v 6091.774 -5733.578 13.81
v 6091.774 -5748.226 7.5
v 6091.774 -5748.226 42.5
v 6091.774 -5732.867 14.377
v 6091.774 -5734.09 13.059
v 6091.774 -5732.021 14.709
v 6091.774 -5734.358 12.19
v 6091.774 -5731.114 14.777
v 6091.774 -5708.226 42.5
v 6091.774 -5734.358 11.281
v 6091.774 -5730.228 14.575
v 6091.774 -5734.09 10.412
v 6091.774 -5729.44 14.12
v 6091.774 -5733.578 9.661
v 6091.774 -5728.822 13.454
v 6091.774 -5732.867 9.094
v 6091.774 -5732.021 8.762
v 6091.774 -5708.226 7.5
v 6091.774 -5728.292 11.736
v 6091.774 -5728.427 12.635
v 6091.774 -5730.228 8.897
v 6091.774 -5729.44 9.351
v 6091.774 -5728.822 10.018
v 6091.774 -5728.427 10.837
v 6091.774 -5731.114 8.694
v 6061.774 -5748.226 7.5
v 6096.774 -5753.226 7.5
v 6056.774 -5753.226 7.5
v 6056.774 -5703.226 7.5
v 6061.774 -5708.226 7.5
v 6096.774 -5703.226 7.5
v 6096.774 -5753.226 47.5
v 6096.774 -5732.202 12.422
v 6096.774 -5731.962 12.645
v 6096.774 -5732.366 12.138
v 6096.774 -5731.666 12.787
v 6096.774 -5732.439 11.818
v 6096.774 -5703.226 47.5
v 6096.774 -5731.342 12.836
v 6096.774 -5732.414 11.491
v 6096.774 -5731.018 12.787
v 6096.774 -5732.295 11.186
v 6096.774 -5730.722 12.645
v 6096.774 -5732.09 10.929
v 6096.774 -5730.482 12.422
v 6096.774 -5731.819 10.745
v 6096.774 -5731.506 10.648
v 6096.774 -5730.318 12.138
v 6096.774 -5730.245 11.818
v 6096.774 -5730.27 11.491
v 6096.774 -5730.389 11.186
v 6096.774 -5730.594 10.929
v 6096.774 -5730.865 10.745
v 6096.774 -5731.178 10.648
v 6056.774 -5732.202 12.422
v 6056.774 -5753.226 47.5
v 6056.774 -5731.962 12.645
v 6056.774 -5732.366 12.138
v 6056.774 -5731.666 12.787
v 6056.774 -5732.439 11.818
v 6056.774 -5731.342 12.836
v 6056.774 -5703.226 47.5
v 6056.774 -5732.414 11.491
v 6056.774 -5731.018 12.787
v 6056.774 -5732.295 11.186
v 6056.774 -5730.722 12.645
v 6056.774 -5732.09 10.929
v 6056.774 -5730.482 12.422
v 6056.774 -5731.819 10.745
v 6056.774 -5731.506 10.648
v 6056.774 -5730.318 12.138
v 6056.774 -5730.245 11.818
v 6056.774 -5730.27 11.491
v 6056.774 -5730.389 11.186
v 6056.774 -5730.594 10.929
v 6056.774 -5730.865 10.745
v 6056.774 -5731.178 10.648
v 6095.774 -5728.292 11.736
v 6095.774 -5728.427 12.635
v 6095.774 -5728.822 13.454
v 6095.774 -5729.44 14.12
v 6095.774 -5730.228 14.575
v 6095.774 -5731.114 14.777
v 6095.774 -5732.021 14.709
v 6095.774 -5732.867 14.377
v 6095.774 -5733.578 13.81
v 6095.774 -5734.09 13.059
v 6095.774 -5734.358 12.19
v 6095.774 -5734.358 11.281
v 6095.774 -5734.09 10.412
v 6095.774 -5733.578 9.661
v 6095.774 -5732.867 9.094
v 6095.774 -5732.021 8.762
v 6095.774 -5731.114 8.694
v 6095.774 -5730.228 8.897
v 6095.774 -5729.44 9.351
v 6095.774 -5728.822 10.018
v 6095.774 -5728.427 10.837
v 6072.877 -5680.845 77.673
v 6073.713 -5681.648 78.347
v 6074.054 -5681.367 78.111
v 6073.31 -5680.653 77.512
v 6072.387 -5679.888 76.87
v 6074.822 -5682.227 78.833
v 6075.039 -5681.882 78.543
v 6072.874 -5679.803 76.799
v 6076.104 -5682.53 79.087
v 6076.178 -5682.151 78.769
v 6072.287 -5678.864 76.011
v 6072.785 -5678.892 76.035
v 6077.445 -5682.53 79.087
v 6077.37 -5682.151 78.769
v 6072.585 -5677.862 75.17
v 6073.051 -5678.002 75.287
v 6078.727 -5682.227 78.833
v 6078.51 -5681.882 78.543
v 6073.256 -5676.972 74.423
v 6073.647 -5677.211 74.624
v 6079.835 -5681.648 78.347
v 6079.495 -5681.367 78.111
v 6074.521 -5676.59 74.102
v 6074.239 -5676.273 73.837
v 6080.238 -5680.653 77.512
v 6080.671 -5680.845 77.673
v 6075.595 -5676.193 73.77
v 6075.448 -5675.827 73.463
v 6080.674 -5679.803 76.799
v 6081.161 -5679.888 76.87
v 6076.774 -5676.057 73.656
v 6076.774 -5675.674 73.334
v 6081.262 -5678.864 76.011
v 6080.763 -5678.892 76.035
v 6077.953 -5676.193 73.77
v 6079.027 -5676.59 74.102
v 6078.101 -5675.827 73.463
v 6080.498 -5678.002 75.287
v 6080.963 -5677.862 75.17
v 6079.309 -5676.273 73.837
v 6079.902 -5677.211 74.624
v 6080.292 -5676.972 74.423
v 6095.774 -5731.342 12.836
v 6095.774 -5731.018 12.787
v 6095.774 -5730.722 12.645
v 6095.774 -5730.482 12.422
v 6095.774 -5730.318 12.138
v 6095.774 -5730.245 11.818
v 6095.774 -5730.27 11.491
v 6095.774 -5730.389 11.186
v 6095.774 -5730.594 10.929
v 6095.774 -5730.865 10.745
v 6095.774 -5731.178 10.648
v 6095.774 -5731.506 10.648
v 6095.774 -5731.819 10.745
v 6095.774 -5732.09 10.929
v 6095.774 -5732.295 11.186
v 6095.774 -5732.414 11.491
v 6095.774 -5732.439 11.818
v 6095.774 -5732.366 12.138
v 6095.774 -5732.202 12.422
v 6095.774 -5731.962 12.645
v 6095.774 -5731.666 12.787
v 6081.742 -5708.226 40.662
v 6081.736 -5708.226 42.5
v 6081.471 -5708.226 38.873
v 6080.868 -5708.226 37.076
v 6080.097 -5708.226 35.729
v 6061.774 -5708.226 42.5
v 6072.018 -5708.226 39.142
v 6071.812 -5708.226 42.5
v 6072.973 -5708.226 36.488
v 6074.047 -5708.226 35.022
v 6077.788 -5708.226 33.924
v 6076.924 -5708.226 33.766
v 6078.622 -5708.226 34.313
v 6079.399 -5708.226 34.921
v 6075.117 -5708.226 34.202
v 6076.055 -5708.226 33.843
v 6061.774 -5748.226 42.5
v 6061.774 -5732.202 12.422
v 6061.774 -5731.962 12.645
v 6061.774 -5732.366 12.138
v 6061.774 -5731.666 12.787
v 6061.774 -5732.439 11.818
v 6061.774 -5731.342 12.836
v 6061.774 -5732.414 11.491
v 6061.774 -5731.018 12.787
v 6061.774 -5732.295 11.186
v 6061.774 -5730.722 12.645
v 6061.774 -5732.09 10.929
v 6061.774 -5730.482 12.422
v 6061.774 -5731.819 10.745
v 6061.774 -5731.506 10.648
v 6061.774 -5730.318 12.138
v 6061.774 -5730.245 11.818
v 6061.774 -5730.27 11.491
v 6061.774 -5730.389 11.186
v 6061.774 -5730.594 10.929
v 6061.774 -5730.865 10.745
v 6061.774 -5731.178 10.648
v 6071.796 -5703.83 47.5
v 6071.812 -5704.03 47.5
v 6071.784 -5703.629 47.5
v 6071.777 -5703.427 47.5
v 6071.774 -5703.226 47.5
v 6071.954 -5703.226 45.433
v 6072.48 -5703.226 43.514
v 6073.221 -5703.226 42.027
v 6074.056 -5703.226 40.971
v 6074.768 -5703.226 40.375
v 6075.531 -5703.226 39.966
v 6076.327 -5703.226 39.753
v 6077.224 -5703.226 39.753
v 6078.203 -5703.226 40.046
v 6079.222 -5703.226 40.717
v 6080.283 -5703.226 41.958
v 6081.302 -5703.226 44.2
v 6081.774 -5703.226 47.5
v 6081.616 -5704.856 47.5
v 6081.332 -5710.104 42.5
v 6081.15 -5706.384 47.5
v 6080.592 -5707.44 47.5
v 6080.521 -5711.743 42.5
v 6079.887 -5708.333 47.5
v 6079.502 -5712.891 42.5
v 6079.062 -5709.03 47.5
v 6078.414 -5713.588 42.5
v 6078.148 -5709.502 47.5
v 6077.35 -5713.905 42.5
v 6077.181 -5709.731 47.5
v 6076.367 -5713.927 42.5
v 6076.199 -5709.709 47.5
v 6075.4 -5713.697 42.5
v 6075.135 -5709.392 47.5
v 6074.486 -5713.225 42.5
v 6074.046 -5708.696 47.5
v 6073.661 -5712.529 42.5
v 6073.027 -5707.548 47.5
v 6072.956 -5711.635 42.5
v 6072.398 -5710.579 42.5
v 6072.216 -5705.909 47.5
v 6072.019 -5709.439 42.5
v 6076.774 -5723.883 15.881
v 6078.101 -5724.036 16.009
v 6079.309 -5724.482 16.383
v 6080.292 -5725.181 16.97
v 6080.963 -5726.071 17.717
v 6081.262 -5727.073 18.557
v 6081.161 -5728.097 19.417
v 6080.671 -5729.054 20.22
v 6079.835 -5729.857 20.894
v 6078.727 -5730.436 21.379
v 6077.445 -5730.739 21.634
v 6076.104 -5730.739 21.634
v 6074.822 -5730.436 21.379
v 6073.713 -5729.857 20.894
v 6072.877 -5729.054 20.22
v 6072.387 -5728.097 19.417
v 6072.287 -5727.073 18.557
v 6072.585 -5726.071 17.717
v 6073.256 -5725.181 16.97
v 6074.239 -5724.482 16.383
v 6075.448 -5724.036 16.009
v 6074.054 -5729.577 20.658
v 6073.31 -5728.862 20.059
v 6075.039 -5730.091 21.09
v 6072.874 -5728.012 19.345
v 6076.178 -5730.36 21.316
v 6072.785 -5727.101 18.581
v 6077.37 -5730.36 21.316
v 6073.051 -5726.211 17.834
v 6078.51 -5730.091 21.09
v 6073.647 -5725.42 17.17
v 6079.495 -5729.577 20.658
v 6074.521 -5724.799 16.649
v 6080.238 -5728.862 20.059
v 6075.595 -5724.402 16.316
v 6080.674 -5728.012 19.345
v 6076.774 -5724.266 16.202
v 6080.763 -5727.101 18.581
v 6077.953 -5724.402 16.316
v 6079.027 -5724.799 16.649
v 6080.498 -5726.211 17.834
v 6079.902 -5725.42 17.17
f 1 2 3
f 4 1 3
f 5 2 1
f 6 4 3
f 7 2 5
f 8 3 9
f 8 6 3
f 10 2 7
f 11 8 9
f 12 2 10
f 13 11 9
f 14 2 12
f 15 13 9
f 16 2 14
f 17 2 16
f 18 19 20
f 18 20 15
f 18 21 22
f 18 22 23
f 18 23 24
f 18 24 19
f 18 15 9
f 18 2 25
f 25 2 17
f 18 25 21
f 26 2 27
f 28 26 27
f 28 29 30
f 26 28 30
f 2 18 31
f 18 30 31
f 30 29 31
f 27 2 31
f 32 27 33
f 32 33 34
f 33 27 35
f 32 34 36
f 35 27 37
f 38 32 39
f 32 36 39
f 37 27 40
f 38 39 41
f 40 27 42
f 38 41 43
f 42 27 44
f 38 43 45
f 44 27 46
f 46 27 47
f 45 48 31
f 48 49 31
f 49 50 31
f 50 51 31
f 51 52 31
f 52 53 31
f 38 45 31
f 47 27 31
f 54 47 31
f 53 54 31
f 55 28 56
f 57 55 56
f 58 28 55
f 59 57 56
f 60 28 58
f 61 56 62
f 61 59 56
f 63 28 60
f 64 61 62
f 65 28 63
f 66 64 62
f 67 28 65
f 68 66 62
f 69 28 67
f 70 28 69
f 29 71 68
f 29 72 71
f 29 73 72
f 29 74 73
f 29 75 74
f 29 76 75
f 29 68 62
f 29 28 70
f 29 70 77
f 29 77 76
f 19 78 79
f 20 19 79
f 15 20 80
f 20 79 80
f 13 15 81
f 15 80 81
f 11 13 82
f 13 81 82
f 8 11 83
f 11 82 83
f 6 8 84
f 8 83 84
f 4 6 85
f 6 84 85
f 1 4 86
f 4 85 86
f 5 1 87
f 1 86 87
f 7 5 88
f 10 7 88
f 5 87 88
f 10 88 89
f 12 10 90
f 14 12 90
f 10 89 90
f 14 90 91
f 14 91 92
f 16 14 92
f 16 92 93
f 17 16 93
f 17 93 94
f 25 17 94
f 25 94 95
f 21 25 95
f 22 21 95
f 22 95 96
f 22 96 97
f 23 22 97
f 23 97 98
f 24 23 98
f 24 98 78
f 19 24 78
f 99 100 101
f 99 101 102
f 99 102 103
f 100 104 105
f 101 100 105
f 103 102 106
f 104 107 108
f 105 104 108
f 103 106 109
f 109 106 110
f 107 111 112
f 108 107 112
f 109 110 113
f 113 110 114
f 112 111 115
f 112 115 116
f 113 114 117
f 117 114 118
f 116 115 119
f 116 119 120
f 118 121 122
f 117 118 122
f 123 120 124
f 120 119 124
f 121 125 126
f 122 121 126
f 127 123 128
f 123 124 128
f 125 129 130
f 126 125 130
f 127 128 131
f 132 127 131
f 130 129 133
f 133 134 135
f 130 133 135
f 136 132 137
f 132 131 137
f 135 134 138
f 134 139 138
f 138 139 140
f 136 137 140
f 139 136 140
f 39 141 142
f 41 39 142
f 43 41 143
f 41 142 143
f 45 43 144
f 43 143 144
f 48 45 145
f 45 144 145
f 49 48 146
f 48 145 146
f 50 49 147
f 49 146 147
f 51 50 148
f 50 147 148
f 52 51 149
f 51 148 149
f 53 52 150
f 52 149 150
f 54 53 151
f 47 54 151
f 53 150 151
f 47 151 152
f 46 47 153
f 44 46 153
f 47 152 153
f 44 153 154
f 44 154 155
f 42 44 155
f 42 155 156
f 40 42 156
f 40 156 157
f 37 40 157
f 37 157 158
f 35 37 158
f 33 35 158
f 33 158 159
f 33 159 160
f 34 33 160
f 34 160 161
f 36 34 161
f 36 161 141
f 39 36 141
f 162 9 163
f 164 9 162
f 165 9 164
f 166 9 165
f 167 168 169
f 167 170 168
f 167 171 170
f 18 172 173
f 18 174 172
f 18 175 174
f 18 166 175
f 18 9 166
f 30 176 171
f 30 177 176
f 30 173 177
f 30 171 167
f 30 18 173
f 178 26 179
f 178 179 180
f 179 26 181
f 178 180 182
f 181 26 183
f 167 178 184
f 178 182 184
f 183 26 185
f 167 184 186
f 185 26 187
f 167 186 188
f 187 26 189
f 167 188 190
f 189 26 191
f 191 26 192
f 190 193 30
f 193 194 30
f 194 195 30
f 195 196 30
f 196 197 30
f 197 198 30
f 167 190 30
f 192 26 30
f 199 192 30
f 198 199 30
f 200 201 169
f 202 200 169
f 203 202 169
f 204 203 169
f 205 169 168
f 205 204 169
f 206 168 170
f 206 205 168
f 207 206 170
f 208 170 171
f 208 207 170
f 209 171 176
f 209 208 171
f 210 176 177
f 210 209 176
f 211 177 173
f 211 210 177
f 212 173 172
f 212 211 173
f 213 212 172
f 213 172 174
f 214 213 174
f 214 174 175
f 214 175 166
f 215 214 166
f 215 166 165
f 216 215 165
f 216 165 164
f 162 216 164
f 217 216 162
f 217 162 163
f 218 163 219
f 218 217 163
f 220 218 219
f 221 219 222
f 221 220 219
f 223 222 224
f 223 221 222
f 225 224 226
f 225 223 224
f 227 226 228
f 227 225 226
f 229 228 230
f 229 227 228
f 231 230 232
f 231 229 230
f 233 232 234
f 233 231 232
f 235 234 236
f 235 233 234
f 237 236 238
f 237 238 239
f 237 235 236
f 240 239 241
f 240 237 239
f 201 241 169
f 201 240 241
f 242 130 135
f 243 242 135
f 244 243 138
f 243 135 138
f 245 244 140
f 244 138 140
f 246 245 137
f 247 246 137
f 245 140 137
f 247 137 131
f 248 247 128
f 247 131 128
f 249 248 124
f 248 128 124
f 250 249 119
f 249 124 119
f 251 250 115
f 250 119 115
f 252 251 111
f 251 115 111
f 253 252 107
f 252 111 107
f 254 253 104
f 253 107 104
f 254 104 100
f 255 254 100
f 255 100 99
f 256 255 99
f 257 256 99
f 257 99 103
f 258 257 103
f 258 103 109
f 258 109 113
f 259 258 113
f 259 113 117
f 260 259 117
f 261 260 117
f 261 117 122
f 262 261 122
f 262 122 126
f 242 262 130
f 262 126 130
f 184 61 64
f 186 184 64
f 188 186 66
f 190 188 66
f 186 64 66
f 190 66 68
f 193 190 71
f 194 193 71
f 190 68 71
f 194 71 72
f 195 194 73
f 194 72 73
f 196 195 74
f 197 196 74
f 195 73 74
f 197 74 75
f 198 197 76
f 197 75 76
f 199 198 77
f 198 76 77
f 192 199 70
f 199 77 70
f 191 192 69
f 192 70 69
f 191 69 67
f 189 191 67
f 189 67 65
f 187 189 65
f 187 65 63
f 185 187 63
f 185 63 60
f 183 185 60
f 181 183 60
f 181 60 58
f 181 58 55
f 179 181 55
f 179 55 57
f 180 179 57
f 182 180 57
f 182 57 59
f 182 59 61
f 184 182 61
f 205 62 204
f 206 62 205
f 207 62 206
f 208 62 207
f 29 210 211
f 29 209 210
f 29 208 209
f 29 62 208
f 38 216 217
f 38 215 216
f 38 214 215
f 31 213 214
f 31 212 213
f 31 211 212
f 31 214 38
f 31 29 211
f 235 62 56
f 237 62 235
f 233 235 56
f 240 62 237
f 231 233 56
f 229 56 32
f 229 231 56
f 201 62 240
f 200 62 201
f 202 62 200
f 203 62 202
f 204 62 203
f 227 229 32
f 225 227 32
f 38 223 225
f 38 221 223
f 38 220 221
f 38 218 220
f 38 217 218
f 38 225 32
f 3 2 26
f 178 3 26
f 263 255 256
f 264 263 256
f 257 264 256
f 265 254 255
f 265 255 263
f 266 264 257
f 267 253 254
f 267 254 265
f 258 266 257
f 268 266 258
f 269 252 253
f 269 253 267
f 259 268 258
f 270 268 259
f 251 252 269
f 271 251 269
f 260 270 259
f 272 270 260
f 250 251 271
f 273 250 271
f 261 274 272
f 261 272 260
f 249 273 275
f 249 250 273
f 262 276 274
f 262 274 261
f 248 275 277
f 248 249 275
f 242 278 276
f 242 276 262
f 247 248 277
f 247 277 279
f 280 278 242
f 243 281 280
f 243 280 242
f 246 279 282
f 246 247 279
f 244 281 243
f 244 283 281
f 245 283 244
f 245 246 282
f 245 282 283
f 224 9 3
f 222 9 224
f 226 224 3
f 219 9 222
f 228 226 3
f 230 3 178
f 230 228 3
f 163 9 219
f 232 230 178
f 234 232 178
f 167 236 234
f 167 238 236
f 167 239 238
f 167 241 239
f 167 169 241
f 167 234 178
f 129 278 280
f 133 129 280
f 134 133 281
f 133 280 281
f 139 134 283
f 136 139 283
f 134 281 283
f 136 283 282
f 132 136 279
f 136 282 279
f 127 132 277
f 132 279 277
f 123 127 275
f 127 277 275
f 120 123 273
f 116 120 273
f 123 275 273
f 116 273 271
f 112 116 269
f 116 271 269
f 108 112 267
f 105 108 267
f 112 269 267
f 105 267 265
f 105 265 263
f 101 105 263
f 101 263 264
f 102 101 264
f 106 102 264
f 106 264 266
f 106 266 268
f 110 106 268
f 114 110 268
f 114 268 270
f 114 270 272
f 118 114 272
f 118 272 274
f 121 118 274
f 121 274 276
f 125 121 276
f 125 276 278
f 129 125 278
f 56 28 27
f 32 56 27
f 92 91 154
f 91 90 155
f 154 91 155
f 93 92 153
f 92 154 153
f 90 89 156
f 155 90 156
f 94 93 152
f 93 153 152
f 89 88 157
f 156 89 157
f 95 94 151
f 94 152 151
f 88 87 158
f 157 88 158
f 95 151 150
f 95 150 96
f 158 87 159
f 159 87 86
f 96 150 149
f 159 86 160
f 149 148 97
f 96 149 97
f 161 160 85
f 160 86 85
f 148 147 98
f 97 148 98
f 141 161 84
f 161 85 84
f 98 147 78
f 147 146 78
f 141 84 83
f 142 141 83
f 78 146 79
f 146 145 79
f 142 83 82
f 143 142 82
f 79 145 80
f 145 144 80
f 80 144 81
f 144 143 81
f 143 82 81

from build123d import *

# Parameters (mm, degrees)
BOSS_EXTRUDE1_START      = 7.5
BOSS_EXTRUDE1_OUTLINE_W  = 40
BOSS_EXTRUDE1_OUTLINE_H  = 50
BOSS_EXTRUDE1_DEPTH      = 40
SKETCH2_W                = 30
SKETCH2_H                = 40
CUT_EXTRUDE1_DEPTH       = 35
SKETCH5_R                = 5
CUT_EXTRUDE2_DEPTH       = 23
SKETCH6_R                = 1.1
CUT_EXTRUDE3_DEPTH       = 88
BOSS_EXTRUDE2_DEPTH      = 37.5
BOSS_EXTRUDE2_DEPTH_BACK = 37.5
SKETCH10_R               = 4.5
SKETCH11_R               = 4
CUT_EXTRUDE6_DEPTH       = 7553.882843097
CUT_EXTRUDE7_START       = -1
SKETCH12_R               = 3.05
CUT_EXTRUDE7_DEPTH       = 13


# Read off the part's stored shape, not the designer's step: Boss-Extrude1
with BuildPart() as part:
    # Boss-Extrude1 outline → Boss-Extrude1 (new body)
    with BuildSketch(Plane.XY.offset(BOSS_EXTRUDE1_START)):
        with Locations((6076.774193548, -5728.225806452)):
            Rectangle(BOSS_EXTRUDE1_OUTLINE_W, BOSS_EXTRUDE1_OUTLINE_H)
    extrude(amount=BOSS_EXTRUDE1_DEPTH)

    # Sketch2 → Cut-Extrude1 (cut)
    with BuildSketch(Plane(origin=(0, 0, 7.5), x_dir=(-1, 0, 0), z_dir=(0, 0, -1))):
        with Locations((-6076.774193548, -5728.225806452)):
            Rectangle(SKETCH2_W, SKETCH2_H)
    extrude(amount=-CUT_EXTRUDE1_DEPTH, mode=Mode.SUBTRACT)

    # Sketch5 → Cut-Extrude2 (cut)
    with BuildSketch(Plane(origin=(0, -2333.046335035, -2780.416351467), x_dir=(-1, 0, 0), z_dir=(0, -0.6427876096865405, -0.766044443118977))):
        with Locations(Location((-6076.774193548, -4399.456848345, 0), (0, 0, 352.919898765))):
            Circle(SKETCH5_R)
    extrude(amount=CUT_EXTRUDE2_DEPTH, mode=Mode.SUBTRACT)

    # Sketch6 → Cut-Extrude3 (cut)
    with BuildSketch(Plane.ZY.offset(-6056.774193548)):
        with Locations((11.735762475, -5731.341961902)):
            Circle(SKETCH6_R)
    extrude(amount=-CUT_EXTRUDE3_DEPTH, mode=Mode.SUBTRACT)

    # Sketch12 → Cut-Extrude7 (cut)
    with BuildSketch(Plane(origin=(6096.774193548, 0, 0), x_dir=(0, 0, -1), z_dir=(1, 0, 0)).offset(CUT_EXTRUDE7_START)):
        with Locations(Location((-11.735762475, -5731.341961902, 0), (0, 0, 90))):
            Circle(SKETCH12_R)
    extrude(amount=-CUT_EXTRUDE7_DEPTH, mode=Mode.SUBTRACT)


with BuildPart() as body_2:
    # Sketch10 → Boss-Extrude2 (new, two sides: drawn at the far end of the back side and taken through both)
    with BuildSketch(Plane(origin=(0, -2333.046335035, -2780.416351467), x_dir=(-1, 0, 0), z_dir=(0, -0.6427876096865405, -0.766044443118977)).offset(-BOSS_EXTRUDE2_DEPTH_BACK)):
        with Locations(Location((-6076.774193548, -4399.456848345, 0), (0, 0, 90))):
            Circle(SKETCH10_R)
    extrude(amount=BOSS_EXTRUDE2_DEPTH + BOSS_EXTRUDE2_DEPTH_BACK)

    # Sketch11 → Cut-Extrude6 (cut, through all)
    with BuildSketch(Plane(origin=(0, -2357.150870398, -2809.143018084), x_dir=(1, 0, 0), z_dir=(0, -0.6427876096865406, -0.766044443118977))):
        with Locations(Location((6076.774193548, 4399.456848345, 0), (0, 0, 270))):
            Circle(SKETCH11_R)
    extrude(amount=-CUT_EXTRUDE6_DEPTH, mode=Mode.SUBTRACT)


solid = Compound([part.part, body_2.part])
